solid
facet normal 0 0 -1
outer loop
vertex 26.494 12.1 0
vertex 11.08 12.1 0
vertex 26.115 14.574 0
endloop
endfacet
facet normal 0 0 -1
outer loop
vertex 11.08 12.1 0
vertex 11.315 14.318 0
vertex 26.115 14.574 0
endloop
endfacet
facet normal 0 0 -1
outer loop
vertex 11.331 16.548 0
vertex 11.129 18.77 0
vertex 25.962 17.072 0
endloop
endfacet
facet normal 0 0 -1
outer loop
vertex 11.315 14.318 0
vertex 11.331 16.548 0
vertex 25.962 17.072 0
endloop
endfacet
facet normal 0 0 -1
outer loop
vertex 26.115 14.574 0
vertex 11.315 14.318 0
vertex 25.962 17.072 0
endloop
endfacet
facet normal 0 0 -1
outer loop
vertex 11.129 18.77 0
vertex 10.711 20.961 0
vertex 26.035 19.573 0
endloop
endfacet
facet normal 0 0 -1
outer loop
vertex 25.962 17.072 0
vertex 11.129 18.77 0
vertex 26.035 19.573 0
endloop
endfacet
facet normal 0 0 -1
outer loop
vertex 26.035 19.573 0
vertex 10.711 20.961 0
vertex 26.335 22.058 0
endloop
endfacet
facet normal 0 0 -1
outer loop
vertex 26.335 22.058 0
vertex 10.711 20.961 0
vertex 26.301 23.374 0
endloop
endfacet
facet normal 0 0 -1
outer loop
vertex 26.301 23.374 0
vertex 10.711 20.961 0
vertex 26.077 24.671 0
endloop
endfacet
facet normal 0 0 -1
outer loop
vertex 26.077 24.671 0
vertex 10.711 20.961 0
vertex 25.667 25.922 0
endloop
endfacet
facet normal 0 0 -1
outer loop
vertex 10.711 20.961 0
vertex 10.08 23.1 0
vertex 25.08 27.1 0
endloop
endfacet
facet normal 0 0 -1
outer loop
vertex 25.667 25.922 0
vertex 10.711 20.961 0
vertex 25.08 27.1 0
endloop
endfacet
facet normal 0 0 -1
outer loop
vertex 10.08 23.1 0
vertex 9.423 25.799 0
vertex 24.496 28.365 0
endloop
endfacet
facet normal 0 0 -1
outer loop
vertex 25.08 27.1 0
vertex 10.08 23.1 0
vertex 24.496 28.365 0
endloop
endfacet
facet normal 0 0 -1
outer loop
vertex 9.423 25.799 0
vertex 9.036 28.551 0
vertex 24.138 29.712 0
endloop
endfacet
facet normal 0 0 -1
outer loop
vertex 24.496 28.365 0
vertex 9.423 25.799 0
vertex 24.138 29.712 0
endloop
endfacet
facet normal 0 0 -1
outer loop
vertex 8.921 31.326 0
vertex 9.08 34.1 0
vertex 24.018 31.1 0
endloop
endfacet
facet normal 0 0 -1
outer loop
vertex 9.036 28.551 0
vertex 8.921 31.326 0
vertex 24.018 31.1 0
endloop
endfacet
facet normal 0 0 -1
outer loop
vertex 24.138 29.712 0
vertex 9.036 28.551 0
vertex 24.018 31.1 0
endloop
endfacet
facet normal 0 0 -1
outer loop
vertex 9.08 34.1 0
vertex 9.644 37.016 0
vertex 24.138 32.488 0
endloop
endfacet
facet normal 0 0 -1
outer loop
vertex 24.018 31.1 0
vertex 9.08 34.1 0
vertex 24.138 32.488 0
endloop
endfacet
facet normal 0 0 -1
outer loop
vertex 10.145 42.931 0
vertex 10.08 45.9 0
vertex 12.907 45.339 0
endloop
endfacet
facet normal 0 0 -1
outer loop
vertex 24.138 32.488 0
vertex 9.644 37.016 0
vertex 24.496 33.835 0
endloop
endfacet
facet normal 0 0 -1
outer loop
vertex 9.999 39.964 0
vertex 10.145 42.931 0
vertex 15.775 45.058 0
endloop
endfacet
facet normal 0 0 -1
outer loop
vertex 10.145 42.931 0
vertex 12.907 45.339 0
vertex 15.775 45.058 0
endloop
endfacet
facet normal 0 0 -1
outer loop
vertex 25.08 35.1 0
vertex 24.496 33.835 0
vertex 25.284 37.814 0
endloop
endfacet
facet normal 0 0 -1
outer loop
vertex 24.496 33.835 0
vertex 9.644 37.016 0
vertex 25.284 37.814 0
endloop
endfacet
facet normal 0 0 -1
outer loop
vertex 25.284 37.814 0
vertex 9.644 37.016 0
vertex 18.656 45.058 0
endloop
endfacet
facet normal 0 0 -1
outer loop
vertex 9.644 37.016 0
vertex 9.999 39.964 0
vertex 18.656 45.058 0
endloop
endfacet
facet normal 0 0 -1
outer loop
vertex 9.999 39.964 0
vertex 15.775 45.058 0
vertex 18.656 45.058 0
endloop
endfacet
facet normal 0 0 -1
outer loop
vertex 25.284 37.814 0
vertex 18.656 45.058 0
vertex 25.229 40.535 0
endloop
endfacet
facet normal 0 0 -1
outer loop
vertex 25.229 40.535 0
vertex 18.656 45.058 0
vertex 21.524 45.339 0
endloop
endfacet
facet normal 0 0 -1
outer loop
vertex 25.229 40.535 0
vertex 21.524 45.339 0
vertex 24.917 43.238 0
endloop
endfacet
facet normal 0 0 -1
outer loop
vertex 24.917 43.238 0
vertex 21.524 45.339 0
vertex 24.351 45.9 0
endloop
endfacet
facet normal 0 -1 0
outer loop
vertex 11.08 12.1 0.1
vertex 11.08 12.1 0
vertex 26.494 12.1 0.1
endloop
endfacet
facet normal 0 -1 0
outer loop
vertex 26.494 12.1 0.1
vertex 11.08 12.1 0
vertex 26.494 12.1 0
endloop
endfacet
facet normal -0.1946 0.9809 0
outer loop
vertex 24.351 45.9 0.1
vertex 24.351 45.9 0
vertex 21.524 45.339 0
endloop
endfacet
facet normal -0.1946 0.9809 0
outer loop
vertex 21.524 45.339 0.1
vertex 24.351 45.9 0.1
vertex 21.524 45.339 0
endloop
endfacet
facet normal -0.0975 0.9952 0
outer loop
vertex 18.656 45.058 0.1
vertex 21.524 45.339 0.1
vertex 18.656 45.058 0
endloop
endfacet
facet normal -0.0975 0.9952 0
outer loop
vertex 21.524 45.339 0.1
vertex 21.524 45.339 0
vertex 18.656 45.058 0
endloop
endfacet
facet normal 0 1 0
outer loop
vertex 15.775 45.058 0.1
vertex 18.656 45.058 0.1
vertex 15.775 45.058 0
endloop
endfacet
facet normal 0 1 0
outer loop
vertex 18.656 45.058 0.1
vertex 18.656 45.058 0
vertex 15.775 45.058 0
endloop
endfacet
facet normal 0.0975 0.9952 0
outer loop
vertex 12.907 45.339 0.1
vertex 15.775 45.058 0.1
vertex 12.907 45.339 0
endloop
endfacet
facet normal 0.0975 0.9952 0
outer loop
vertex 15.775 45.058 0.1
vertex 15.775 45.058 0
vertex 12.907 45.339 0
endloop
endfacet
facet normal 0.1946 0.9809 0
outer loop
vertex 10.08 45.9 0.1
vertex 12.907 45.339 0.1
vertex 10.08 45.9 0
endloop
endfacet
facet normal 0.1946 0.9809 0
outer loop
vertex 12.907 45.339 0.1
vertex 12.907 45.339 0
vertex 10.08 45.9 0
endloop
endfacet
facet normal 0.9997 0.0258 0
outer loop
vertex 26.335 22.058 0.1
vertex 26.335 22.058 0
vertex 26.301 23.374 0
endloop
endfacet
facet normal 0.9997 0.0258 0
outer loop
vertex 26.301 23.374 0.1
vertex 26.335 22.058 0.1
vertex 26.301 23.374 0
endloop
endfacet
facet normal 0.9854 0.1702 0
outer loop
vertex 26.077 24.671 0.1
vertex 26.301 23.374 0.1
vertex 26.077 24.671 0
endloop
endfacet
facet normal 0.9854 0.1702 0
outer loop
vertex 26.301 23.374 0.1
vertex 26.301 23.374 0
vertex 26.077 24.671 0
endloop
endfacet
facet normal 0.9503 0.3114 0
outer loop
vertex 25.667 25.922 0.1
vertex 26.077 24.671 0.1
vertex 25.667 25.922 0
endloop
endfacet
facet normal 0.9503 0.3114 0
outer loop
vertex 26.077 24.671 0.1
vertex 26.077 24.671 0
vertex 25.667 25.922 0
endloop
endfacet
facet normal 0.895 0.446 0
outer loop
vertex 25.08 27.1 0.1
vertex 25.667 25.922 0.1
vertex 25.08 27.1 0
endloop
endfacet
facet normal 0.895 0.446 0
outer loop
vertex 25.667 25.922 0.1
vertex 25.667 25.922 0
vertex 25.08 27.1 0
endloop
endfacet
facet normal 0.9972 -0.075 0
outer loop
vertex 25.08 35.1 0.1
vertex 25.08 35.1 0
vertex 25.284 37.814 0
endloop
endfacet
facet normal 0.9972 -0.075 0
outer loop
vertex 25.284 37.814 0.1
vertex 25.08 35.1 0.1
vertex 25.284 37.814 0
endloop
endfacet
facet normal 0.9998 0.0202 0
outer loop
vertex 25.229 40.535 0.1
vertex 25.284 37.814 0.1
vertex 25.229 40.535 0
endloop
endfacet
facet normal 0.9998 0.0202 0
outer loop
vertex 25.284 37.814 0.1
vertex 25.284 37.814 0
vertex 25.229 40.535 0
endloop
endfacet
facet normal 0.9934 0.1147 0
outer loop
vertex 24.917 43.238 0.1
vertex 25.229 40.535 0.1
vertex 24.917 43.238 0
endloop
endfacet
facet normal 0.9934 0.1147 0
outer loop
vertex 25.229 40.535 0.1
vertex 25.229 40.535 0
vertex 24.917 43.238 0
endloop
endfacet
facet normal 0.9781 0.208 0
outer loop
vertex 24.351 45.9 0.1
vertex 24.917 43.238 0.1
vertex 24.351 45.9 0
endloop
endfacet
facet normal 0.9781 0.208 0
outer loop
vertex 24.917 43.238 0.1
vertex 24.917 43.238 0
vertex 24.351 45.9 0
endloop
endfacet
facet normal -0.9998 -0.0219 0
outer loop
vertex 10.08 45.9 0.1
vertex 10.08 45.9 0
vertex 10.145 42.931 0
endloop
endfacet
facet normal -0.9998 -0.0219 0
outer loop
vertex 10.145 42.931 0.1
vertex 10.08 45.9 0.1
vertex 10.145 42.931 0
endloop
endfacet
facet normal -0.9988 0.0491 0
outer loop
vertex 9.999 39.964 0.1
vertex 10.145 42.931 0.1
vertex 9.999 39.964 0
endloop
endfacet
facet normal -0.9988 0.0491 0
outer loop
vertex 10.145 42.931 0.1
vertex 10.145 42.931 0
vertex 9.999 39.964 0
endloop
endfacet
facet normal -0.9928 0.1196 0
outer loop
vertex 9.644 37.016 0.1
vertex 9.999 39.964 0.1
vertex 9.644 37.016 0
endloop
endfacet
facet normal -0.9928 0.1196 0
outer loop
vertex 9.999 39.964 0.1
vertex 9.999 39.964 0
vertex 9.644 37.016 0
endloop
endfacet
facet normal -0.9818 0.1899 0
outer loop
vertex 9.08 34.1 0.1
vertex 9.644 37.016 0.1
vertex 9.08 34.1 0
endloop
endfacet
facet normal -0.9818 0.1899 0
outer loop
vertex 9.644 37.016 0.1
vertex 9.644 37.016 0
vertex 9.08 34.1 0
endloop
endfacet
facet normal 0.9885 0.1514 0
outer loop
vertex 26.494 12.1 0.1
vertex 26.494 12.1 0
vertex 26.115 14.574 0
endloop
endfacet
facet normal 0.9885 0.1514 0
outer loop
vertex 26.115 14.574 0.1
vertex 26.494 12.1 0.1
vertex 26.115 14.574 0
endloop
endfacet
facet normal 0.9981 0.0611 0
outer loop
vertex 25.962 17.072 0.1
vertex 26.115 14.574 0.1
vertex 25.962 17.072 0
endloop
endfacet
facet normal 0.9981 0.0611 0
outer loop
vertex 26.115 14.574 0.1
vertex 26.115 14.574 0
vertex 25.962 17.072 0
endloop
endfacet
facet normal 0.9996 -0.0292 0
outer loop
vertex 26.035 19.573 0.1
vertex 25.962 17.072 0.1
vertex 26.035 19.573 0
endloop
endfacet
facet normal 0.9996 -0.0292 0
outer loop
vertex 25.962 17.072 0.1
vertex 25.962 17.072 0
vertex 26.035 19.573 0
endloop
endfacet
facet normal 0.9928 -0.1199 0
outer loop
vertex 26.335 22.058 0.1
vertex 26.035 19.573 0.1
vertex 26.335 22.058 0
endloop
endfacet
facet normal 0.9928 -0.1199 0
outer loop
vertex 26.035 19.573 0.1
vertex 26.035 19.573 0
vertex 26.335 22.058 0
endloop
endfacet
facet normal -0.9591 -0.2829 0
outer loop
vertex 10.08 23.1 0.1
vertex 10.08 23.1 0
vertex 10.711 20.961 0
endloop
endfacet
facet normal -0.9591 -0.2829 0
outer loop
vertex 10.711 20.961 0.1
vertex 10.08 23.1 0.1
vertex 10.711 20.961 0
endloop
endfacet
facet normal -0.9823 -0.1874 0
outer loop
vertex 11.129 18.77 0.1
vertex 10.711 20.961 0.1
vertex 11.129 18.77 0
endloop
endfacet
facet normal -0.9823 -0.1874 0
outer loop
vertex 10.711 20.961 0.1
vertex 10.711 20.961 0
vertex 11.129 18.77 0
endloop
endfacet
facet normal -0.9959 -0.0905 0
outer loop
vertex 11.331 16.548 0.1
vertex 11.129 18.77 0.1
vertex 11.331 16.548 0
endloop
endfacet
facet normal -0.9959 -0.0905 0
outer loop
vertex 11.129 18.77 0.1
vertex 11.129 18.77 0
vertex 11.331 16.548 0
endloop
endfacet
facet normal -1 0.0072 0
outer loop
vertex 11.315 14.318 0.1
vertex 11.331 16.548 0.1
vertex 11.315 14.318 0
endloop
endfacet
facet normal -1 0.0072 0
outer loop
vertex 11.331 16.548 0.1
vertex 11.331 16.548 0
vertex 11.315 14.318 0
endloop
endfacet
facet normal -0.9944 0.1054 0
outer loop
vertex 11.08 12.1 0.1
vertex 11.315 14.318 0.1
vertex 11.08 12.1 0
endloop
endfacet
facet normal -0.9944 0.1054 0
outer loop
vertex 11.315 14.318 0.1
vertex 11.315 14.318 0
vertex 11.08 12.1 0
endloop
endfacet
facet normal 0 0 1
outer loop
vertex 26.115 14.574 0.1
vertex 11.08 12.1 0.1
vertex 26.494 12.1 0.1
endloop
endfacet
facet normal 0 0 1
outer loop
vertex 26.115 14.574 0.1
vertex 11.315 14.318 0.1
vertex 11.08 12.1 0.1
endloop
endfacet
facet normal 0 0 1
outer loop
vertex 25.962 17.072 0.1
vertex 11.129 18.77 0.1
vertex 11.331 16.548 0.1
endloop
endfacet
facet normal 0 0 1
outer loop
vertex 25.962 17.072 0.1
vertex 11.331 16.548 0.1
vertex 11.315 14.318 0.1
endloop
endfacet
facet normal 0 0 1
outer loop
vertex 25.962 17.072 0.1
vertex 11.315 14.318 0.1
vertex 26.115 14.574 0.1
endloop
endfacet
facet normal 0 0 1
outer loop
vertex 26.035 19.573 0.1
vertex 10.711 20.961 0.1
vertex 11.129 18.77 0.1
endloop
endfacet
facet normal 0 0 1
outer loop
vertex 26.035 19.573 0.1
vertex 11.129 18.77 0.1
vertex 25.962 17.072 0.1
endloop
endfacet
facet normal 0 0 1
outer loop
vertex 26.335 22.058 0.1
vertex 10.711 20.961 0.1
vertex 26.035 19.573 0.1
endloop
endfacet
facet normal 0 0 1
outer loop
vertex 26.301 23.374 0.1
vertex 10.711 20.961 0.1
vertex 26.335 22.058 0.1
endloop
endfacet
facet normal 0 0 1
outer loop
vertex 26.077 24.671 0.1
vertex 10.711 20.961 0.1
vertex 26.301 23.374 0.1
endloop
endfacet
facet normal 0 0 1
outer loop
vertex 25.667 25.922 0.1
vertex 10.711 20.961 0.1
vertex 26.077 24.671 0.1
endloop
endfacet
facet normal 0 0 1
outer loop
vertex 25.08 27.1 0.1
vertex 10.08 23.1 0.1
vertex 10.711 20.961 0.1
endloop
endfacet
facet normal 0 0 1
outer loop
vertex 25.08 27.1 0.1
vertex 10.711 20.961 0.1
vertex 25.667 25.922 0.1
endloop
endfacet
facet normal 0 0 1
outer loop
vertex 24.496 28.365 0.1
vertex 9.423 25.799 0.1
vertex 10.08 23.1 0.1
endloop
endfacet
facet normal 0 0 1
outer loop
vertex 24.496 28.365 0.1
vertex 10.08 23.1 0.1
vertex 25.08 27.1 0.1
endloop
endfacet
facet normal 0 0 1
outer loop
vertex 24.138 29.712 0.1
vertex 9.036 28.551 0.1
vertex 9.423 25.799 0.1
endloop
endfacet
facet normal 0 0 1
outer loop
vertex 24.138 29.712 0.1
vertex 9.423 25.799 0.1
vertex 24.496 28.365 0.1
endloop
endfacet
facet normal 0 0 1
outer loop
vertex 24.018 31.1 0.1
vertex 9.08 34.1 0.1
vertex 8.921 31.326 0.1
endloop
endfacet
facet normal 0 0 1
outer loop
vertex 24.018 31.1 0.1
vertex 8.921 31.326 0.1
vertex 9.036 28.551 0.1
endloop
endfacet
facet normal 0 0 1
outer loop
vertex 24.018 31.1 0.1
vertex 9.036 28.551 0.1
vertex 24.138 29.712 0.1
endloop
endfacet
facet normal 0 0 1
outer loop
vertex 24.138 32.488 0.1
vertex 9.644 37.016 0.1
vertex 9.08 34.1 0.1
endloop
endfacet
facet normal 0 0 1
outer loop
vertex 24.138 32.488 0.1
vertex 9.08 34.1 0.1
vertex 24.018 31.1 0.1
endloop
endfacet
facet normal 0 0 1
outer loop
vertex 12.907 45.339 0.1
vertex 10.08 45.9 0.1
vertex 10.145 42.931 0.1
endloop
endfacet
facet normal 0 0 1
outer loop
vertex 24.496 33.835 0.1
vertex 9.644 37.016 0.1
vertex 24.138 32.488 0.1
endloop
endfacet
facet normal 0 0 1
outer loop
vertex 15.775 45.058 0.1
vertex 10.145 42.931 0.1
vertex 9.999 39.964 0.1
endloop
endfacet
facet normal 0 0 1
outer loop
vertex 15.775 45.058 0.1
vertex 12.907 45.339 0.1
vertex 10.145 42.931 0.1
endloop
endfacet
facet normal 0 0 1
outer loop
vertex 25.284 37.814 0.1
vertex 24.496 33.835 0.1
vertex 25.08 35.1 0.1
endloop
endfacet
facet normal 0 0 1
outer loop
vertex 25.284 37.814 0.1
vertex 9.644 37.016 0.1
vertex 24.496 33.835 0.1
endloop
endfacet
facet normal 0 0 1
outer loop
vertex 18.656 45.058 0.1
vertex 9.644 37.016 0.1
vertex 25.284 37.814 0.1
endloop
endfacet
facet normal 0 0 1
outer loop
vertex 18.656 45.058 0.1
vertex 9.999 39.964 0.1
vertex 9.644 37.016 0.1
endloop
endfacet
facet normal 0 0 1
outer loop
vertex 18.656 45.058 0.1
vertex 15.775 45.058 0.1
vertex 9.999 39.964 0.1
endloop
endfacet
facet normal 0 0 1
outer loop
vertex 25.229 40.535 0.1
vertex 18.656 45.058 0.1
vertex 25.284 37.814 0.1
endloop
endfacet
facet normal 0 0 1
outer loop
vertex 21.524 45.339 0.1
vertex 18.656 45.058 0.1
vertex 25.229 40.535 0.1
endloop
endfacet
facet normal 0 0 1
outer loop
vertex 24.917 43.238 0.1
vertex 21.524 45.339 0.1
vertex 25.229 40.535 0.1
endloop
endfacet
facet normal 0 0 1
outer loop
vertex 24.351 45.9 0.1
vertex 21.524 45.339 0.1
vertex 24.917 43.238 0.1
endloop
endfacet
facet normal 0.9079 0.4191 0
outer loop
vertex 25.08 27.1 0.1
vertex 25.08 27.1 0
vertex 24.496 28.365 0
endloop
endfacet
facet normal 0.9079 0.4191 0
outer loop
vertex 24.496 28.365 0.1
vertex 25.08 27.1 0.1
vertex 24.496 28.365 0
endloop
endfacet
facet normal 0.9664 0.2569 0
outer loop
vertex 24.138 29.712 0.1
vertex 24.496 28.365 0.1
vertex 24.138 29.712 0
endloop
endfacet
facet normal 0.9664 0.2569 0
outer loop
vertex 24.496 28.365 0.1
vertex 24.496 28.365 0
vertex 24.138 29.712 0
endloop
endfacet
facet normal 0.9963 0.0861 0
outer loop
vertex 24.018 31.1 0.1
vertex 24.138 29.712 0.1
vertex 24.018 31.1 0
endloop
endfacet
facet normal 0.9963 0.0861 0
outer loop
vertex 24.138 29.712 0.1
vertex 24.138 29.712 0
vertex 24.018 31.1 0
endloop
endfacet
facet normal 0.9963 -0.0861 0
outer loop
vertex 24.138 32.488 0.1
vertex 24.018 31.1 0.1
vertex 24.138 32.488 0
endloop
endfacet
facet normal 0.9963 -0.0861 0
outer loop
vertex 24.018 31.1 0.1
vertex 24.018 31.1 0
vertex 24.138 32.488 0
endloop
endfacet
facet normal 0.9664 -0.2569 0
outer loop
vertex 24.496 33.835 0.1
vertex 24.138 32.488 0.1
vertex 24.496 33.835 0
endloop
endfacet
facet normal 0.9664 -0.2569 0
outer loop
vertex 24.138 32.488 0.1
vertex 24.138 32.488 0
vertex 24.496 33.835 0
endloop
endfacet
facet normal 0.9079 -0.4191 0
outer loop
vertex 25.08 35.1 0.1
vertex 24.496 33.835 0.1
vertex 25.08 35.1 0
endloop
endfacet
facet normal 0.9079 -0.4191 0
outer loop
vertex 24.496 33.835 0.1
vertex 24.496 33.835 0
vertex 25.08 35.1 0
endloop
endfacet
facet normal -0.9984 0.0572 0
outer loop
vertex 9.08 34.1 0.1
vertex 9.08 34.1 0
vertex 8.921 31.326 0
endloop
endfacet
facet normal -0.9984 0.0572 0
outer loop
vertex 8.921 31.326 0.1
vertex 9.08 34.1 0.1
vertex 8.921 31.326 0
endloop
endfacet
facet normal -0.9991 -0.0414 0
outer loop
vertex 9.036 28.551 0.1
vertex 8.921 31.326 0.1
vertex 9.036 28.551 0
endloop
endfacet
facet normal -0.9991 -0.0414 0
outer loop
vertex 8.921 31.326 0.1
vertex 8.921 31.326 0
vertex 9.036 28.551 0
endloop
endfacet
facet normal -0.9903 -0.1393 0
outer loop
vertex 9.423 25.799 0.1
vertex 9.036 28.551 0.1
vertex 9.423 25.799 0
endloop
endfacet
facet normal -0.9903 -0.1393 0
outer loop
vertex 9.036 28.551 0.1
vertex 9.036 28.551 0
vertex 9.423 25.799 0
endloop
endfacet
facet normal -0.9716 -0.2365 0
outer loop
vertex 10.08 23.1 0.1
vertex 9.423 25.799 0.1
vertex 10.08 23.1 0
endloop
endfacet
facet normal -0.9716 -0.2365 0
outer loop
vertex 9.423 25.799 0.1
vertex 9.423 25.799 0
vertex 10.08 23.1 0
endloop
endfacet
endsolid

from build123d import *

# Parameters (mm, degrees)
SALIENTE_EXTRUIR1_DEPTH = 0.1


with BuildPart() as part:
    # Model → Saliente-Extruir1 (new body)
    with BuildSketch(Plane.XY):
        with BuildLine():
            Line((11.080118073, 12.100032616), (26.494172291, 12.100013434))
            ThreePointArc((26.494172291, 12.100013434), (25.962033929, 17.071786447), (26.334882576, 22.058035741))
            ThreePointArc((26.334882576, 22.058035741), (26.077271745, 24.671051179), (25.080126231, 27.100025003))
            ThreePointArc((25.080126231, 27.100025003), (24.017870658, 31.10002558), (25.080130581, 35.100025003))
            ThreePointArc((25.080130581, 35.100025003), (25.229028906, 40.534712367), (24.350613381, 45.900006732))
            ThreePointArc((24.350613381, 45.900006732), (17.215374003, 45.022517475), (10.080135103, 45.900010617))
            ThreePointArc((10.080135103, 45.900010617), (9.999432675, 39.964488004), (9.080130038, 34.100033704))
            ThreePointArc((9.080130038, 34.100033704), (9.035519695, 28.550523972), (10.080124055, 23.10003316))
            ThreePointArc((10.080124055, 23.10003316), (11.257202038, 17.661585333), (11.080118073, 12.100032616))
        make_face()
    extrude(amount=SALIENTE_EXTRUIR1_DEPTH)


solid = part.part
